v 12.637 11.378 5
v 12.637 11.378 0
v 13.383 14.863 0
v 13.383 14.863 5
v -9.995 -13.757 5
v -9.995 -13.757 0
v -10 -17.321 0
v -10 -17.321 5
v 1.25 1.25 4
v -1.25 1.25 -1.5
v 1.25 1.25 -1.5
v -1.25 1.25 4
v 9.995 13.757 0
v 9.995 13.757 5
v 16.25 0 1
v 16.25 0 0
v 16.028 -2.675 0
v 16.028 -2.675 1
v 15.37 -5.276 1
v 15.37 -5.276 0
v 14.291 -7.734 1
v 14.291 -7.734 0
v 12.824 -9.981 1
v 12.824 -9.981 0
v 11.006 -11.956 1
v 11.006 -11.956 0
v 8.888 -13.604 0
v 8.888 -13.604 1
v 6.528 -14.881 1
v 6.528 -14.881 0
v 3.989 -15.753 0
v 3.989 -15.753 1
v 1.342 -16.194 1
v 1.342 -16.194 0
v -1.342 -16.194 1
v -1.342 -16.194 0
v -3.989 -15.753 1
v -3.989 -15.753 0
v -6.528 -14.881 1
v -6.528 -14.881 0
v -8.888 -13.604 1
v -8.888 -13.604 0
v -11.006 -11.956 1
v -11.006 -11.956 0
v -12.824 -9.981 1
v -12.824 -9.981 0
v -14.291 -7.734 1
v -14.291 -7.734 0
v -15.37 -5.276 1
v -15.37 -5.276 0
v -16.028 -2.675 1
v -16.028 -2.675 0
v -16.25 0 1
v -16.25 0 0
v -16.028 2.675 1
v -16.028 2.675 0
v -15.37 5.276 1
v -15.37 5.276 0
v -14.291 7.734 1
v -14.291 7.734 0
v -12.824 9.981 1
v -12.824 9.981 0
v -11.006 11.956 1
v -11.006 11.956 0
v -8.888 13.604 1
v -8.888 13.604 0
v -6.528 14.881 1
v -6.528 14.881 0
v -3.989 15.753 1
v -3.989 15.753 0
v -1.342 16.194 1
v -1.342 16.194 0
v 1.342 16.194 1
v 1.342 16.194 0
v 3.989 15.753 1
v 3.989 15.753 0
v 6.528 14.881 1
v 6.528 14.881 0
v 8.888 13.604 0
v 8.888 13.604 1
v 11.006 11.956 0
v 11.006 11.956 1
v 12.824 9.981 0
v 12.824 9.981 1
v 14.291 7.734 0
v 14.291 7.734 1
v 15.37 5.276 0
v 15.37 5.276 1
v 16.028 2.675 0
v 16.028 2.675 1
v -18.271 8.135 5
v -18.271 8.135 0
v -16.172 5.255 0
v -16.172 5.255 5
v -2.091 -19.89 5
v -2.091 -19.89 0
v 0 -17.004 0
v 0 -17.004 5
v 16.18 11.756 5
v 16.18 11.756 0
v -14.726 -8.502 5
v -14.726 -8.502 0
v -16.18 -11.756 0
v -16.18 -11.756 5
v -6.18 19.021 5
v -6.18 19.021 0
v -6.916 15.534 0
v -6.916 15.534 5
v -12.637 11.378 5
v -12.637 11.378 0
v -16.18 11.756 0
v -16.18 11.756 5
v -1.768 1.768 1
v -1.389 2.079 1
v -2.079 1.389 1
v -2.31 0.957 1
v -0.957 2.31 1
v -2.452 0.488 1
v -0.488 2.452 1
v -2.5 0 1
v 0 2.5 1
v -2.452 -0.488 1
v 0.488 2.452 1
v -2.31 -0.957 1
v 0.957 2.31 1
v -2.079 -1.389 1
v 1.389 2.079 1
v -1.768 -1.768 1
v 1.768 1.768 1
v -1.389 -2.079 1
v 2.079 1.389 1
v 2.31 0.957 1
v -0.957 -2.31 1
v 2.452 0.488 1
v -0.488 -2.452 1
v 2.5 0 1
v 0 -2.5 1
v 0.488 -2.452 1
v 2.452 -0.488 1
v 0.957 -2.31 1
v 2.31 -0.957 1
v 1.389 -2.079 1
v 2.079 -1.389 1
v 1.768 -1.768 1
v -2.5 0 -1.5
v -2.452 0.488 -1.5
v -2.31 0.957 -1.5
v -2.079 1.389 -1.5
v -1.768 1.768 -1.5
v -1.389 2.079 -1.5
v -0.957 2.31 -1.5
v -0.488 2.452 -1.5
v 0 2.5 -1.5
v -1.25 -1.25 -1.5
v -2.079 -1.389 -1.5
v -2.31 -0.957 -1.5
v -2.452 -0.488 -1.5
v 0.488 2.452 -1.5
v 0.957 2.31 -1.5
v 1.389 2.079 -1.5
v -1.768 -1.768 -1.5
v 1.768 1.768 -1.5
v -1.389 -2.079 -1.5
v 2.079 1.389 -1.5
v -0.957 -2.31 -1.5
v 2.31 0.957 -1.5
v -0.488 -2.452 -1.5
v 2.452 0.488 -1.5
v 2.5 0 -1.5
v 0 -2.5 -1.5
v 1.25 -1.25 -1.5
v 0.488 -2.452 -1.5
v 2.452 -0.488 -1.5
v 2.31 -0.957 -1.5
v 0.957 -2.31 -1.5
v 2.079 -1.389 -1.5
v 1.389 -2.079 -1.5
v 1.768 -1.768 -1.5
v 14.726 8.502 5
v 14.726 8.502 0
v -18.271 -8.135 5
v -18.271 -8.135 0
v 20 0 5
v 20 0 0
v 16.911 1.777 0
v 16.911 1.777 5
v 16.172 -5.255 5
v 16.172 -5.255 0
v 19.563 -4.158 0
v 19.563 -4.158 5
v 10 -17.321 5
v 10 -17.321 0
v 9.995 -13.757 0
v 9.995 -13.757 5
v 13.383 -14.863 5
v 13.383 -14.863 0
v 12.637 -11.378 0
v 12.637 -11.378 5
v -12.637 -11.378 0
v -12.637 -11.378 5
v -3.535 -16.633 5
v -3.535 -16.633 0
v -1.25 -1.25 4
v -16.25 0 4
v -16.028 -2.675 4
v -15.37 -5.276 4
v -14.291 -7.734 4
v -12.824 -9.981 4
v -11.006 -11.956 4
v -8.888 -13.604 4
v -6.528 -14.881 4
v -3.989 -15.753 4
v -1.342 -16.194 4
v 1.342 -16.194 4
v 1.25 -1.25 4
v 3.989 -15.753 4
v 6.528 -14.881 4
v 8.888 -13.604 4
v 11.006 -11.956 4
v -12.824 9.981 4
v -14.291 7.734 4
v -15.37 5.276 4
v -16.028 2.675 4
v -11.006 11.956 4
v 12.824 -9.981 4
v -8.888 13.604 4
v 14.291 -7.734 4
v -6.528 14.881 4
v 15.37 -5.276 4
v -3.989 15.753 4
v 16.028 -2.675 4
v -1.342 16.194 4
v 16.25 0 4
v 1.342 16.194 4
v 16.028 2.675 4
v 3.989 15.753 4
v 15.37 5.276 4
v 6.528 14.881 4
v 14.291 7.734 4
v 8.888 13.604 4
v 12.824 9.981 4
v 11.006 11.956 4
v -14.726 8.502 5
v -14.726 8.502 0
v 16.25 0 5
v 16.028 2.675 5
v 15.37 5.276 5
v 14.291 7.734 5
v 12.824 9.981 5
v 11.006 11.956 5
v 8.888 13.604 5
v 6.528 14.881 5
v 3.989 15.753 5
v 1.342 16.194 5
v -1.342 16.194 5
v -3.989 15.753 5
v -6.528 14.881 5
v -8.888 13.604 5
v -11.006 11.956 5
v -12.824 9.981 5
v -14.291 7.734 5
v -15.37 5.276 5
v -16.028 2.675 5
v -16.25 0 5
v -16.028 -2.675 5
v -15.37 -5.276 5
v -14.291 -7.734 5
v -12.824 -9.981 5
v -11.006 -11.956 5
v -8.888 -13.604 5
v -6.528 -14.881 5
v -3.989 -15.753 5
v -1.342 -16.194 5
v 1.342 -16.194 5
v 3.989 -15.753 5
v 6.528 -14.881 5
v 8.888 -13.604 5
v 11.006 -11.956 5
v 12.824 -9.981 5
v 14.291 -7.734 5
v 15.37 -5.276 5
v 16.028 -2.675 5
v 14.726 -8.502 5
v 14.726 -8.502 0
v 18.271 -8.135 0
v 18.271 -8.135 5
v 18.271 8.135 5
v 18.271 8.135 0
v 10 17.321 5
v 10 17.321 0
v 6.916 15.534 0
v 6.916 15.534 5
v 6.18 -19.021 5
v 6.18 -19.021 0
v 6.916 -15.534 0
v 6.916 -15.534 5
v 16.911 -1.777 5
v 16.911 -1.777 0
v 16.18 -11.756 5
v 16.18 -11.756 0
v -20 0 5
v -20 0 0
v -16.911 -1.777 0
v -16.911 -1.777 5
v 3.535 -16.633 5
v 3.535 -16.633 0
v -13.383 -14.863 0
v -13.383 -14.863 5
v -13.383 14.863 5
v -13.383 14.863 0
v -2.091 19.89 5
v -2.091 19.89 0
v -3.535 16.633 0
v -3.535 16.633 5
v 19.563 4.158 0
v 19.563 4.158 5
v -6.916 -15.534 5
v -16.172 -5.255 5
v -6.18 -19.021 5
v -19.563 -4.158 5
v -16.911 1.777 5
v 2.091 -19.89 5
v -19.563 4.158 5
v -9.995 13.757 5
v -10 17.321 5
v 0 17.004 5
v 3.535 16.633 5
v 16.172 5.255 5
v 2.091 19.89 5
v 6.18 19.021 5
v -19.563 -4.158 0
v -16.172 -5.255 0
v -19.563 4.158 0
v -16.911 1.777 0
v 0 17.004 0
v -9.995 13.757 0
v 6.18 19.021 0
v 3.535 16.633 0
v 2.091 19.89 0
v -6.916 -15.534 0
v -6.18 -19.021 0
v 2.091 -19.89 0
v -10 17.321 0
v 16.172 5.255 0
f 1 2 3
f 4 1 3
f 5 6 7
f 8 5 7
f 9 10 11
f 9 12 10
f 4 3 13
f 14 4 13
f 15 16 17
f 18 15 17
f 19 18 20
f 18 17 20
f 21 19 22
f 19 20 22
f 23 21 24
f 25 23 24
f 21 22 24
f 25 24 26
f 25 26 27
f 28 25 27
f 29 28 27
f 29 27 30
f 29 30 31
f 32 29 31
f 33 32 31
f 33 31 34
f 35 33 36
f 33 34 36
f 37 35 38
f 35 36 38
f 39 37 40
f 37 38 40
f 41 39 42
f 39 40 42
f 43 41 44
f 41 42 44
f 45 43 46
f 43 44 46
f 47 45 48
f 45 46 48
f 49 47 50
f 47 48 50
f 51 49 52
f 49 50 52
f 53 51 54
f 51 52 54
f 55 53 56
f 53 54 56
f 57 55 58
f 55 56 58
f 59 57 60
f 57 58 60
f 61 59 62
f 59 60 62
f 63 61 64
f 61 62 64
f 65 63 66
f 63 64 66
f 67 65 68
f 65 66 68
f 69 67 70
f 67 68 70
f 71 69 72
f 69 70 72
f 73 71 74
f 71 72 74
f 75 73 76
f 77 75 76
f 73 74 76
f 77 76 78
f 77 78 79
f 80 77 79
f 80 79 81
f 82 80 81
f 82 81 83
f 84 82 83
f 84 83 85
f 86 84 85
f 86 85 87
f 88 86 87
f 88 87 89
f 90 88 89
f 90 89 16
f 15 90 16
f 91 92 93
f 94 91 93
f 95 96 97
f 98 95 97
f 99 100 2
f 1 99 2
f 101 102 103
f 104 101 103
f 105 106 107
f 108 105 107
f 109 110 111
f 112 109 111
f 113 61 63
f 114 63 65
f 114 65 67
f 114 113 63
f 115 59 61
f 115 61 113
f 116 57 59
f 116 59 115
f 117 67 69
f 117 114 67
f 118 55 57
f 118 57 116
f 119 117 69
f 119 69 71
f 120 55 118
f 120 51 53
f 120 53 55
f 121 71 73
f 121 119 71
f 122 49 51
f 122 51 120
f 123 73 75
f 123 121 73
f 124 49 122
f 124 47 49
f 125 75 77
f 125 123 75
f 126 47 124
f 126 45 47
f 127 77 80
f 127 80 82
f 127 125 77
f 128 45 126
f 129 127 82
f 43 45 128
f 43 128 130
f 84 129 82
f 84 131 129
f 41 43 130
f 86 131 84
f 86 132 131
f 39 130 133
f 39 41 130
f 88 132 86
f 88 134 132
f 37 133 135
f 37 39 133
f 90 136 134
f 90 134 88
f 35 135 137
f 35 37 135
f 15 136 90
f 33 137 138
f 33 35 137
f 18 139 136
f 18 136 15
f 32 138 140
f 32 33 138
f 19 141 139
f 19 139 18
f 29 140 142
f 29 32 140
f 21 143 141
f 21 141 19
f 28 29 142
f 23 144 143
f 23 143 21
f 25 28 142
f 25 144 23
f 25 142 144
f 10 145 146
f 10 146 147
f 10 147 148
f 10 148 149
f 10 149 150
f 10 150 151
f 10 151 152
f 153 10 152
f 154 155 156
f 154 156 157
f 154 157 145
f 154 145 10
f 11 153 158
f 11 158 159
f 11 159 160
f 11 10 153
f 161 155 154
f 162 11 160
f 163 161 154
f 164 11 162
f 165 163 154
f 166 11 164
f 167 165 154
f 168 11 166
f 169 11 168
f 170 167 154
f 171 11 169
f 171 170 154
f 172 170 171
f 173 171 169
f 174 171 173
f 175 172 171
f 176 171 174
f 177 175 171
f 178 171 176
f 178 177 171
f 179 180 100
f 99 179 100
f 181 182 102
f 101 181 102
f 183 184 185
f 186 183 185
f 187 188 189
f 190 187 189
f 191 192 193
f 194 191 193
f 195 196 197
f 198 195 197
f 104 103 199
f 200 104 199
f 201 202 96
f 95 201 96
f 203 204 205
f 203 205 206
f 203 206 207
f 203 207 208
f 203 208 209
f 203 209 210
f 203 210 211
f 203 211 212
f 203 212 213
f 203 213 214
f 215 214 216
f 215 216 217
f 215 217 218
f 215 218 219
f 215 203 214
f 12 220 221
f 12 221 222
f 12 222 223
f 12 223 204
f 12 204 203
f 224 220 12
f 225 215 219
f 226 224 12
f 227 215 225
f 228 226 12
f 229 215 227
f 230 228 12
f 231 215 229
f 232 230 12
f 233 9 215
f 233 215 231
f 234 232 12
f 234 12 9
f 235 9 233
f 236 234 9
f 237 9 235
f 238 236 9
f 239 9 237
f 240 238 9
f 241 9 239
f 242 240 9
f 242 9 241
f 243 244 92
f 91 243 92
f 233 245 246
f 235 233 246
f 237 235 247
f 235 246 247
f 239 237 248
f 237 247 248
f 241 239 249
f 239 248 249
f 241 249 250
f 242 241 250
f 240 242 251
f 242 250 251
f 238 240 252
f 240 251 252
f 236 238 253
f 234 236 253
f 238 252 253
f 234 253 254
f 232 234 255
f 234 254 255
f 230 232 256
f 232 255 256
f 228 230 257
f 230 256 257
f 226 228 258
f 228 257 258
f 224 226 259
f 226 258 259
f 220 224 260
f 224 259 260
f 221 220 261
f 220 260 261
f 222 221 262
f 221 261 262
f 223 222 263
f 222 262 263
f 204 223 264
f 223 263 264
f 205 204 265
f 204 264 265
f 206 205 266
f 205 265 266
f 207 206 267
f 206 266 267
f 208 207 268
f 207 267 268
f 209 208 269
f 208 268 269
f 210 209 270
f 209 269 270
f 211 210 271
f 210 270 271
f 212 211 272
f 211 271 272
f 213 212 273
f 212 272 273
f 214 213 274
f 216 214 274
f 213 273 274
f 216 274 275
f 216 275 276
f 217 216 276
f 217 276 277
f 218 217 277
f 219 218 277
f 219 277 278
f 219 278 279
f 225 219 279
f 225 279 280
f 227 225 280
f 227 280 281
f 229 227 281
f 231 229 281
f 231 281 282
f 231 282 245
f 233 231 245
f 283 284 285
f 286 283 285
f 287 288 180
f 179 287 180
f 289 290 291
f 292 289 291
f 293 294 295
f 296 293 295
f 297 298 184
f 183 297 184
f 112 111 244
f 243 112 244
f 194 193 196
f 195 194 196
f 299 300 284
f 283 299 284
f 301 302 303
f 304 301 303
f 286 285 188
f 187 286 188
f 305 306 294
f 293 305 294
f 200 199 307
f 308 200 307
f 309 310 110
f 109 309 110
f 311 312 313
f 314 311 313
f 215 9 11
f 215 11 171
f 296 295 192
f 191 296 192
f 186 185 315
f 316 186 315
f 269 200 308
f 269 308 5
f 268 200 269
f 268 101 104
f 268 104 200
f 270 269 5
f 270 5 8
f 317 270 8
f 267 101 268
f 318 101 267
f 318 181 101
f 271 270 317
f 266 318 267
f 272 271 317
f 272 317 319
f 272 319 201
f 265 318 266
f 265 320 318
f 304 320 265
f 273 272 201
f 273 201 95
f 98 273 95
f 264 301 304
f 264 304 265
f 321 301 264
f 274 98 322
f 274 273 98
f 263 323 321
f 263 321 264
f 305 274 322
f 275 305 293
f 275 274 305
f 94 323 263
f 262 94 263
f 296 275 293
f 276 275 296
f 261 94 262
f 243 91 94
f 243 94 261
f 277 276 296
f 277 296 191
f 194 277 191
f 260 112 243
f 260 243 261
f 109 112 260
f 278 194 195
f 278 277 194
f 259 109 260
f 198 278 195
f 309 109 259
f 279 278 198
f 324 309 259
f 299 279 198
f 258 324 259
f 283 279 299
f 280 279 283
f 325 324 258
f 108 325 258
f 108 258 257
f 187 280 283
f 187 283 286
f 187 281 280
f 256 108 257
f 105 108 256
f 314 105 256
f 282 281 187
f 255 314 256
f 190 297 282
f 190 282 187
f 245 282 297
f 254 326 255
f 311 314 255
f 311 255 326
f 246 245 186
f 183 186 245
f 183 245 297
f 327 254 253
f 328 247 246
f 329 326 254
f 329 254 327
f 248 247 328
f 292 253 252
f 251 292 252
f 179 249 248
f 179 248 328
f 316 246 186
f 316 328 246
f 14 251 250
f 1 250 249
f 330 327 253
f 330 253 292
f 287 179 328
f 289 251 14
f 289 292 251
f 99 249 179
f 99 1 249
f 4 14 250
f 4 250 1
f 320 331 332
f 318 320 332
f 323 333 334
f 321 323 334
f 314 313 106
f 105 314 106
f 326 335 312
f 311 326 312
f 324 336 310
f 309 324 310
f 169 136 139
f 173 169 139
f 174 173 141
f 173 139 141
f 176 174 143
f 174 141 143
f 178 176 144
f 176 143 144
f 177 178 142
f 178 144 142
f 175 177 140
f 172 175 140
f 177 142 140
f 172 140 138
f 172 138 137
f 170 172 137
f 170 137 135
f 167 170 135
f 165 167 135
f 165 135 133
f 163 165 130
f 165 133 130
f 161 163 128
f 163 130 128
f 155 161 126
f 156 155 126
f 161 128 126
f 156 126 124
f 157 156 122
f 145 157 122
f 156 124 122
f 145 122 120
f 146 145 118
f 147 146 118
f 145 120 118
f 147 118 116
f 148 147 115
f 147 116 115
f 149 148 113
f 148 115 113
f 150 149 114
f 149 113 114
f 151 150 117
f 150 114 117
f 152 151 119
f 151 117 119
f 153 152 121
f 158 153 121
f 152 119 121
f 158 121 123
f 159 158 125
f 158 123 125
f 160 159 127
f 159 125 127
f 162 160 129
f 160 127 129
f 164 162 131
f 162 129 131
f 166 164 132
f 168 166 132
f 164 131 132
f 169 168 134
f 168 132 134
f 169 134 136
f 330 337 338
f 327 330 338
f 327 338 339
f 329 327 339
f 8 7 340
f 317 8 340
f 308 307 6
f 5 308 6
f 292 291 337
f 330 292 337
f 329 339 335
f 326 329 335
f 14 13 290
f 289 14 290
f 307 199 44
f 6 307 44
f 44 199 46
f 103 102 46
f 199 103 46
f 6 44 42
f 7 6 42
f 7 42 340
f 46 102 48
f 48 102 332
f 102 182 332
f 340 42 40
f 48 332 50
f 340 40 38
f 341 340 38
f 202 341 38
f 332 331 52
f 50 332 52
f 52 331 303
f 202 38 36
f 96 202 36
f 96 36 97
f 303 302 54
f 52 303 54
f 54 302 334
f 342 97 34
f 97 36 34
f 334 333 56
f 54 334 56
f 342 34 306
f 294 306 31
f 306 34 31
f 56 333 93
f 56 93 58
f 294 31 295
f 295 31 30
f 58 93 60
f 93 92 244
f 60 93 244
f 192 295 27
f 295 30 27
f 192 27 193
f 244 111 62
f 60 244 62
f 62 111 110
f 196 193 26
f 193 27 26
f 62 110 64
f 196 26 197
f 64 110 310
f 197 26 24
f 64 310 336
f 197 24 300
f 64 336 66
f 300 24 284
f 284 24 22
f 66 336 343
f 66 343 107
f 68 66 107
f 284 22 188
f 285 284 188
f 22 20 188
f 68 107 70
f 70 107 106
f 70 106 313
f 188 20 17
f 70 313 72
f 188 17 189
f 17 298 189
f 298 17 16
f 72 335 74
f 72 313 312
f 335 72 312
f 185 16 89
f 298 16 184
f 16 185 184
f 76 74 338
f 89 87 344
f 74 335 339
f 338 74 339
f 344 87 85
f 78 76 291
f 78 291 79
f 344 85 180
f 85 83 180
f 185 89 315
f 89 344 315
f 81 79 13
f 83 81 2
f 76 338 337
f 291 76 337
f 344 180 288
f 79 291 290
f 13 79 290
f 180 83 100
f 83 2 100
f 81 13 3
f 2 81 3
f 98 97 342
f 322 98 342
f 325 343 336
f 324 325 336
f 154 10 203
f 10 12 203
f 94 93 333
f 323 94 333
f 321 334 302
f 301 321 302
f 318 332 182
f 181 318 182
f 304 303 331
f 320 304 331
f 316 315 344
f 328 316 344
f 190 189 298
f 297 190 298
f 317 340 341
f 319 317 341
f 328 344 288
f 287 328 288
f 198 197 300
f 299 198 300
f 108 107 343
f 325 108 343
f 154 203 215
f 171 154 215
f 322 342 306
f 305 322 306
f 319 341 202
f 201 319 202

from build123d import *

# Parameters (mm, degrees)
F0_W     = 2.5
F0_H     = 2.5
F1_DEPTH = 5
F2_R     = 16.25
F2_W     = 2.5
F2_H     = 2.5
F3_DEPTH = 1
F4_R     = 16.25
F4_W     = 2.5
F4_H     = 2.5
F5_DEPTH = 1
F6_R     = 2.5
F6_W     = 2.5
F6_H     = 2.5
F7_DEPTH = 2.5


with BuildPart() as f1:
    # F0 (on Top) → F1 (new body)
    with BuildSketch(Plane.XY):
        Polygon((16.9110578052, -1.7774237981), (20, 0), (16.9110578052, 1.7774237981), (19.5629520147, 4.1582338164), (16.1719634308, 5.2545894454), (18.2709091529, 8.1347328615), (14.7260766529, 8.5021043196), (16.1803398875, 11.7557050458), (12.6365896616, 11.3780364374), (13.3826121272, 14.8628965095), (9.9948230651, 13.7566937651), (10, 17.3205080757), (6.9162347401, 15.5341175632), (6.1803398875, 19.0211303259), (3.5353737692, 16.6326258829), (2.0905692654, 19.8904379074), (0, 17.0042086393), (-2.0905692654, 19.8904379074), (-3.5353737692, 16.6326258829), (-6.1803398875, 19.0211303259), (-6.9162347401, 15.5341175632), (-10, 17.3205080757), (-9.9948230651, 13.7566937651), (-13.3826121272, 14.8628965095), (-12.6365896616, 11.3780364374), (-16.1803398875, 11.7557050458), (-14.7260766529, 8.5021043196), (-18.2709091529, 8.1347328615), (-16.1719634308, 5.2545894454), (-19.5629520147, 4.1582338164), (-16.9110578052, 1.7774237981), (-20, 0), (-16.9110578052, -1.7774237981), (-19.5629520147, -4.1582338164), (-16.1719634308, -5.2545894454), (-18.2709091529, -8.1347328615), (-14.7260766529, -8.5021043196), (-16.1803398875, -11.7557050458), (-12.6365896616, -11.3780364374), (-13.3826121272, -14.8628965095), (-9.9948230651, -13.7566937651), (-10, -17.3205080757), (-6.9162347401, -15.5341175632), (-6.1803398875, -19.0211303259), (-3.5353737692, -16.6326258829), (-2.0905692654, -19.8904379074), (0, -17.0042086393), (2.0905692654, -19.8904379074), (3.5353737692, -16.6326258829), (6.1803398875, -19.0211303259), (6.9162347401, -15.5341175632), (10, -17.3205080757), (9.9948230651, -13.7566937651), (13.3826121272, -14.8628965095), (12.6365896616, -11.3780364374), (16.1803398875, -11.7557050458), (14.7260766529, -8.5021043196), (18.2709091529, -8.1347328615), (16.1719634308, -5.2545894454), (19.5629520147, -4.1582338164), align=None)
        Rectangle(F0_W, F0_H, mode=Mode.SUBTRACT)
    extrude(amount=F1_DEPTH)

    # F2 (on face) → F3 (cut)
    with BuildSketch(Plane(origin=(0, 0, 0), x_dir=(1, 0, 0), z_dir=(0, 0, -1))):
        Circle(F2_R)
        Rectangle(F2_W, F2_H, mode=Mode.SUBTRACT)
    extrude(amount=-F3_DEPTH, mode=Mode.SUBTRACT)

    # F4 (on face) → F5 (cut)
    with BuildSketch(Plane.XY.offset(5)):
        Circle(F4_R)
        Rectangle(F4_W, F4_H, mode=Mode.SUBTRACT)
    extrude(amount=-F5_DEPTH, mode=Mode.SUBTRACT)

    # F6 (on face) → F7 (join)
    with BuildSketch(Plane(origin=(0, 0, 1), x_dir=(1, 0, 0), z_dir=(0, 0, -1))):
        Circle(F6_R)
        Rectangle(F6_W, F6_H, mode=Mode.SUBTRACT)
    extrude(amount=F7_DEPTH)


solid = f1.part
